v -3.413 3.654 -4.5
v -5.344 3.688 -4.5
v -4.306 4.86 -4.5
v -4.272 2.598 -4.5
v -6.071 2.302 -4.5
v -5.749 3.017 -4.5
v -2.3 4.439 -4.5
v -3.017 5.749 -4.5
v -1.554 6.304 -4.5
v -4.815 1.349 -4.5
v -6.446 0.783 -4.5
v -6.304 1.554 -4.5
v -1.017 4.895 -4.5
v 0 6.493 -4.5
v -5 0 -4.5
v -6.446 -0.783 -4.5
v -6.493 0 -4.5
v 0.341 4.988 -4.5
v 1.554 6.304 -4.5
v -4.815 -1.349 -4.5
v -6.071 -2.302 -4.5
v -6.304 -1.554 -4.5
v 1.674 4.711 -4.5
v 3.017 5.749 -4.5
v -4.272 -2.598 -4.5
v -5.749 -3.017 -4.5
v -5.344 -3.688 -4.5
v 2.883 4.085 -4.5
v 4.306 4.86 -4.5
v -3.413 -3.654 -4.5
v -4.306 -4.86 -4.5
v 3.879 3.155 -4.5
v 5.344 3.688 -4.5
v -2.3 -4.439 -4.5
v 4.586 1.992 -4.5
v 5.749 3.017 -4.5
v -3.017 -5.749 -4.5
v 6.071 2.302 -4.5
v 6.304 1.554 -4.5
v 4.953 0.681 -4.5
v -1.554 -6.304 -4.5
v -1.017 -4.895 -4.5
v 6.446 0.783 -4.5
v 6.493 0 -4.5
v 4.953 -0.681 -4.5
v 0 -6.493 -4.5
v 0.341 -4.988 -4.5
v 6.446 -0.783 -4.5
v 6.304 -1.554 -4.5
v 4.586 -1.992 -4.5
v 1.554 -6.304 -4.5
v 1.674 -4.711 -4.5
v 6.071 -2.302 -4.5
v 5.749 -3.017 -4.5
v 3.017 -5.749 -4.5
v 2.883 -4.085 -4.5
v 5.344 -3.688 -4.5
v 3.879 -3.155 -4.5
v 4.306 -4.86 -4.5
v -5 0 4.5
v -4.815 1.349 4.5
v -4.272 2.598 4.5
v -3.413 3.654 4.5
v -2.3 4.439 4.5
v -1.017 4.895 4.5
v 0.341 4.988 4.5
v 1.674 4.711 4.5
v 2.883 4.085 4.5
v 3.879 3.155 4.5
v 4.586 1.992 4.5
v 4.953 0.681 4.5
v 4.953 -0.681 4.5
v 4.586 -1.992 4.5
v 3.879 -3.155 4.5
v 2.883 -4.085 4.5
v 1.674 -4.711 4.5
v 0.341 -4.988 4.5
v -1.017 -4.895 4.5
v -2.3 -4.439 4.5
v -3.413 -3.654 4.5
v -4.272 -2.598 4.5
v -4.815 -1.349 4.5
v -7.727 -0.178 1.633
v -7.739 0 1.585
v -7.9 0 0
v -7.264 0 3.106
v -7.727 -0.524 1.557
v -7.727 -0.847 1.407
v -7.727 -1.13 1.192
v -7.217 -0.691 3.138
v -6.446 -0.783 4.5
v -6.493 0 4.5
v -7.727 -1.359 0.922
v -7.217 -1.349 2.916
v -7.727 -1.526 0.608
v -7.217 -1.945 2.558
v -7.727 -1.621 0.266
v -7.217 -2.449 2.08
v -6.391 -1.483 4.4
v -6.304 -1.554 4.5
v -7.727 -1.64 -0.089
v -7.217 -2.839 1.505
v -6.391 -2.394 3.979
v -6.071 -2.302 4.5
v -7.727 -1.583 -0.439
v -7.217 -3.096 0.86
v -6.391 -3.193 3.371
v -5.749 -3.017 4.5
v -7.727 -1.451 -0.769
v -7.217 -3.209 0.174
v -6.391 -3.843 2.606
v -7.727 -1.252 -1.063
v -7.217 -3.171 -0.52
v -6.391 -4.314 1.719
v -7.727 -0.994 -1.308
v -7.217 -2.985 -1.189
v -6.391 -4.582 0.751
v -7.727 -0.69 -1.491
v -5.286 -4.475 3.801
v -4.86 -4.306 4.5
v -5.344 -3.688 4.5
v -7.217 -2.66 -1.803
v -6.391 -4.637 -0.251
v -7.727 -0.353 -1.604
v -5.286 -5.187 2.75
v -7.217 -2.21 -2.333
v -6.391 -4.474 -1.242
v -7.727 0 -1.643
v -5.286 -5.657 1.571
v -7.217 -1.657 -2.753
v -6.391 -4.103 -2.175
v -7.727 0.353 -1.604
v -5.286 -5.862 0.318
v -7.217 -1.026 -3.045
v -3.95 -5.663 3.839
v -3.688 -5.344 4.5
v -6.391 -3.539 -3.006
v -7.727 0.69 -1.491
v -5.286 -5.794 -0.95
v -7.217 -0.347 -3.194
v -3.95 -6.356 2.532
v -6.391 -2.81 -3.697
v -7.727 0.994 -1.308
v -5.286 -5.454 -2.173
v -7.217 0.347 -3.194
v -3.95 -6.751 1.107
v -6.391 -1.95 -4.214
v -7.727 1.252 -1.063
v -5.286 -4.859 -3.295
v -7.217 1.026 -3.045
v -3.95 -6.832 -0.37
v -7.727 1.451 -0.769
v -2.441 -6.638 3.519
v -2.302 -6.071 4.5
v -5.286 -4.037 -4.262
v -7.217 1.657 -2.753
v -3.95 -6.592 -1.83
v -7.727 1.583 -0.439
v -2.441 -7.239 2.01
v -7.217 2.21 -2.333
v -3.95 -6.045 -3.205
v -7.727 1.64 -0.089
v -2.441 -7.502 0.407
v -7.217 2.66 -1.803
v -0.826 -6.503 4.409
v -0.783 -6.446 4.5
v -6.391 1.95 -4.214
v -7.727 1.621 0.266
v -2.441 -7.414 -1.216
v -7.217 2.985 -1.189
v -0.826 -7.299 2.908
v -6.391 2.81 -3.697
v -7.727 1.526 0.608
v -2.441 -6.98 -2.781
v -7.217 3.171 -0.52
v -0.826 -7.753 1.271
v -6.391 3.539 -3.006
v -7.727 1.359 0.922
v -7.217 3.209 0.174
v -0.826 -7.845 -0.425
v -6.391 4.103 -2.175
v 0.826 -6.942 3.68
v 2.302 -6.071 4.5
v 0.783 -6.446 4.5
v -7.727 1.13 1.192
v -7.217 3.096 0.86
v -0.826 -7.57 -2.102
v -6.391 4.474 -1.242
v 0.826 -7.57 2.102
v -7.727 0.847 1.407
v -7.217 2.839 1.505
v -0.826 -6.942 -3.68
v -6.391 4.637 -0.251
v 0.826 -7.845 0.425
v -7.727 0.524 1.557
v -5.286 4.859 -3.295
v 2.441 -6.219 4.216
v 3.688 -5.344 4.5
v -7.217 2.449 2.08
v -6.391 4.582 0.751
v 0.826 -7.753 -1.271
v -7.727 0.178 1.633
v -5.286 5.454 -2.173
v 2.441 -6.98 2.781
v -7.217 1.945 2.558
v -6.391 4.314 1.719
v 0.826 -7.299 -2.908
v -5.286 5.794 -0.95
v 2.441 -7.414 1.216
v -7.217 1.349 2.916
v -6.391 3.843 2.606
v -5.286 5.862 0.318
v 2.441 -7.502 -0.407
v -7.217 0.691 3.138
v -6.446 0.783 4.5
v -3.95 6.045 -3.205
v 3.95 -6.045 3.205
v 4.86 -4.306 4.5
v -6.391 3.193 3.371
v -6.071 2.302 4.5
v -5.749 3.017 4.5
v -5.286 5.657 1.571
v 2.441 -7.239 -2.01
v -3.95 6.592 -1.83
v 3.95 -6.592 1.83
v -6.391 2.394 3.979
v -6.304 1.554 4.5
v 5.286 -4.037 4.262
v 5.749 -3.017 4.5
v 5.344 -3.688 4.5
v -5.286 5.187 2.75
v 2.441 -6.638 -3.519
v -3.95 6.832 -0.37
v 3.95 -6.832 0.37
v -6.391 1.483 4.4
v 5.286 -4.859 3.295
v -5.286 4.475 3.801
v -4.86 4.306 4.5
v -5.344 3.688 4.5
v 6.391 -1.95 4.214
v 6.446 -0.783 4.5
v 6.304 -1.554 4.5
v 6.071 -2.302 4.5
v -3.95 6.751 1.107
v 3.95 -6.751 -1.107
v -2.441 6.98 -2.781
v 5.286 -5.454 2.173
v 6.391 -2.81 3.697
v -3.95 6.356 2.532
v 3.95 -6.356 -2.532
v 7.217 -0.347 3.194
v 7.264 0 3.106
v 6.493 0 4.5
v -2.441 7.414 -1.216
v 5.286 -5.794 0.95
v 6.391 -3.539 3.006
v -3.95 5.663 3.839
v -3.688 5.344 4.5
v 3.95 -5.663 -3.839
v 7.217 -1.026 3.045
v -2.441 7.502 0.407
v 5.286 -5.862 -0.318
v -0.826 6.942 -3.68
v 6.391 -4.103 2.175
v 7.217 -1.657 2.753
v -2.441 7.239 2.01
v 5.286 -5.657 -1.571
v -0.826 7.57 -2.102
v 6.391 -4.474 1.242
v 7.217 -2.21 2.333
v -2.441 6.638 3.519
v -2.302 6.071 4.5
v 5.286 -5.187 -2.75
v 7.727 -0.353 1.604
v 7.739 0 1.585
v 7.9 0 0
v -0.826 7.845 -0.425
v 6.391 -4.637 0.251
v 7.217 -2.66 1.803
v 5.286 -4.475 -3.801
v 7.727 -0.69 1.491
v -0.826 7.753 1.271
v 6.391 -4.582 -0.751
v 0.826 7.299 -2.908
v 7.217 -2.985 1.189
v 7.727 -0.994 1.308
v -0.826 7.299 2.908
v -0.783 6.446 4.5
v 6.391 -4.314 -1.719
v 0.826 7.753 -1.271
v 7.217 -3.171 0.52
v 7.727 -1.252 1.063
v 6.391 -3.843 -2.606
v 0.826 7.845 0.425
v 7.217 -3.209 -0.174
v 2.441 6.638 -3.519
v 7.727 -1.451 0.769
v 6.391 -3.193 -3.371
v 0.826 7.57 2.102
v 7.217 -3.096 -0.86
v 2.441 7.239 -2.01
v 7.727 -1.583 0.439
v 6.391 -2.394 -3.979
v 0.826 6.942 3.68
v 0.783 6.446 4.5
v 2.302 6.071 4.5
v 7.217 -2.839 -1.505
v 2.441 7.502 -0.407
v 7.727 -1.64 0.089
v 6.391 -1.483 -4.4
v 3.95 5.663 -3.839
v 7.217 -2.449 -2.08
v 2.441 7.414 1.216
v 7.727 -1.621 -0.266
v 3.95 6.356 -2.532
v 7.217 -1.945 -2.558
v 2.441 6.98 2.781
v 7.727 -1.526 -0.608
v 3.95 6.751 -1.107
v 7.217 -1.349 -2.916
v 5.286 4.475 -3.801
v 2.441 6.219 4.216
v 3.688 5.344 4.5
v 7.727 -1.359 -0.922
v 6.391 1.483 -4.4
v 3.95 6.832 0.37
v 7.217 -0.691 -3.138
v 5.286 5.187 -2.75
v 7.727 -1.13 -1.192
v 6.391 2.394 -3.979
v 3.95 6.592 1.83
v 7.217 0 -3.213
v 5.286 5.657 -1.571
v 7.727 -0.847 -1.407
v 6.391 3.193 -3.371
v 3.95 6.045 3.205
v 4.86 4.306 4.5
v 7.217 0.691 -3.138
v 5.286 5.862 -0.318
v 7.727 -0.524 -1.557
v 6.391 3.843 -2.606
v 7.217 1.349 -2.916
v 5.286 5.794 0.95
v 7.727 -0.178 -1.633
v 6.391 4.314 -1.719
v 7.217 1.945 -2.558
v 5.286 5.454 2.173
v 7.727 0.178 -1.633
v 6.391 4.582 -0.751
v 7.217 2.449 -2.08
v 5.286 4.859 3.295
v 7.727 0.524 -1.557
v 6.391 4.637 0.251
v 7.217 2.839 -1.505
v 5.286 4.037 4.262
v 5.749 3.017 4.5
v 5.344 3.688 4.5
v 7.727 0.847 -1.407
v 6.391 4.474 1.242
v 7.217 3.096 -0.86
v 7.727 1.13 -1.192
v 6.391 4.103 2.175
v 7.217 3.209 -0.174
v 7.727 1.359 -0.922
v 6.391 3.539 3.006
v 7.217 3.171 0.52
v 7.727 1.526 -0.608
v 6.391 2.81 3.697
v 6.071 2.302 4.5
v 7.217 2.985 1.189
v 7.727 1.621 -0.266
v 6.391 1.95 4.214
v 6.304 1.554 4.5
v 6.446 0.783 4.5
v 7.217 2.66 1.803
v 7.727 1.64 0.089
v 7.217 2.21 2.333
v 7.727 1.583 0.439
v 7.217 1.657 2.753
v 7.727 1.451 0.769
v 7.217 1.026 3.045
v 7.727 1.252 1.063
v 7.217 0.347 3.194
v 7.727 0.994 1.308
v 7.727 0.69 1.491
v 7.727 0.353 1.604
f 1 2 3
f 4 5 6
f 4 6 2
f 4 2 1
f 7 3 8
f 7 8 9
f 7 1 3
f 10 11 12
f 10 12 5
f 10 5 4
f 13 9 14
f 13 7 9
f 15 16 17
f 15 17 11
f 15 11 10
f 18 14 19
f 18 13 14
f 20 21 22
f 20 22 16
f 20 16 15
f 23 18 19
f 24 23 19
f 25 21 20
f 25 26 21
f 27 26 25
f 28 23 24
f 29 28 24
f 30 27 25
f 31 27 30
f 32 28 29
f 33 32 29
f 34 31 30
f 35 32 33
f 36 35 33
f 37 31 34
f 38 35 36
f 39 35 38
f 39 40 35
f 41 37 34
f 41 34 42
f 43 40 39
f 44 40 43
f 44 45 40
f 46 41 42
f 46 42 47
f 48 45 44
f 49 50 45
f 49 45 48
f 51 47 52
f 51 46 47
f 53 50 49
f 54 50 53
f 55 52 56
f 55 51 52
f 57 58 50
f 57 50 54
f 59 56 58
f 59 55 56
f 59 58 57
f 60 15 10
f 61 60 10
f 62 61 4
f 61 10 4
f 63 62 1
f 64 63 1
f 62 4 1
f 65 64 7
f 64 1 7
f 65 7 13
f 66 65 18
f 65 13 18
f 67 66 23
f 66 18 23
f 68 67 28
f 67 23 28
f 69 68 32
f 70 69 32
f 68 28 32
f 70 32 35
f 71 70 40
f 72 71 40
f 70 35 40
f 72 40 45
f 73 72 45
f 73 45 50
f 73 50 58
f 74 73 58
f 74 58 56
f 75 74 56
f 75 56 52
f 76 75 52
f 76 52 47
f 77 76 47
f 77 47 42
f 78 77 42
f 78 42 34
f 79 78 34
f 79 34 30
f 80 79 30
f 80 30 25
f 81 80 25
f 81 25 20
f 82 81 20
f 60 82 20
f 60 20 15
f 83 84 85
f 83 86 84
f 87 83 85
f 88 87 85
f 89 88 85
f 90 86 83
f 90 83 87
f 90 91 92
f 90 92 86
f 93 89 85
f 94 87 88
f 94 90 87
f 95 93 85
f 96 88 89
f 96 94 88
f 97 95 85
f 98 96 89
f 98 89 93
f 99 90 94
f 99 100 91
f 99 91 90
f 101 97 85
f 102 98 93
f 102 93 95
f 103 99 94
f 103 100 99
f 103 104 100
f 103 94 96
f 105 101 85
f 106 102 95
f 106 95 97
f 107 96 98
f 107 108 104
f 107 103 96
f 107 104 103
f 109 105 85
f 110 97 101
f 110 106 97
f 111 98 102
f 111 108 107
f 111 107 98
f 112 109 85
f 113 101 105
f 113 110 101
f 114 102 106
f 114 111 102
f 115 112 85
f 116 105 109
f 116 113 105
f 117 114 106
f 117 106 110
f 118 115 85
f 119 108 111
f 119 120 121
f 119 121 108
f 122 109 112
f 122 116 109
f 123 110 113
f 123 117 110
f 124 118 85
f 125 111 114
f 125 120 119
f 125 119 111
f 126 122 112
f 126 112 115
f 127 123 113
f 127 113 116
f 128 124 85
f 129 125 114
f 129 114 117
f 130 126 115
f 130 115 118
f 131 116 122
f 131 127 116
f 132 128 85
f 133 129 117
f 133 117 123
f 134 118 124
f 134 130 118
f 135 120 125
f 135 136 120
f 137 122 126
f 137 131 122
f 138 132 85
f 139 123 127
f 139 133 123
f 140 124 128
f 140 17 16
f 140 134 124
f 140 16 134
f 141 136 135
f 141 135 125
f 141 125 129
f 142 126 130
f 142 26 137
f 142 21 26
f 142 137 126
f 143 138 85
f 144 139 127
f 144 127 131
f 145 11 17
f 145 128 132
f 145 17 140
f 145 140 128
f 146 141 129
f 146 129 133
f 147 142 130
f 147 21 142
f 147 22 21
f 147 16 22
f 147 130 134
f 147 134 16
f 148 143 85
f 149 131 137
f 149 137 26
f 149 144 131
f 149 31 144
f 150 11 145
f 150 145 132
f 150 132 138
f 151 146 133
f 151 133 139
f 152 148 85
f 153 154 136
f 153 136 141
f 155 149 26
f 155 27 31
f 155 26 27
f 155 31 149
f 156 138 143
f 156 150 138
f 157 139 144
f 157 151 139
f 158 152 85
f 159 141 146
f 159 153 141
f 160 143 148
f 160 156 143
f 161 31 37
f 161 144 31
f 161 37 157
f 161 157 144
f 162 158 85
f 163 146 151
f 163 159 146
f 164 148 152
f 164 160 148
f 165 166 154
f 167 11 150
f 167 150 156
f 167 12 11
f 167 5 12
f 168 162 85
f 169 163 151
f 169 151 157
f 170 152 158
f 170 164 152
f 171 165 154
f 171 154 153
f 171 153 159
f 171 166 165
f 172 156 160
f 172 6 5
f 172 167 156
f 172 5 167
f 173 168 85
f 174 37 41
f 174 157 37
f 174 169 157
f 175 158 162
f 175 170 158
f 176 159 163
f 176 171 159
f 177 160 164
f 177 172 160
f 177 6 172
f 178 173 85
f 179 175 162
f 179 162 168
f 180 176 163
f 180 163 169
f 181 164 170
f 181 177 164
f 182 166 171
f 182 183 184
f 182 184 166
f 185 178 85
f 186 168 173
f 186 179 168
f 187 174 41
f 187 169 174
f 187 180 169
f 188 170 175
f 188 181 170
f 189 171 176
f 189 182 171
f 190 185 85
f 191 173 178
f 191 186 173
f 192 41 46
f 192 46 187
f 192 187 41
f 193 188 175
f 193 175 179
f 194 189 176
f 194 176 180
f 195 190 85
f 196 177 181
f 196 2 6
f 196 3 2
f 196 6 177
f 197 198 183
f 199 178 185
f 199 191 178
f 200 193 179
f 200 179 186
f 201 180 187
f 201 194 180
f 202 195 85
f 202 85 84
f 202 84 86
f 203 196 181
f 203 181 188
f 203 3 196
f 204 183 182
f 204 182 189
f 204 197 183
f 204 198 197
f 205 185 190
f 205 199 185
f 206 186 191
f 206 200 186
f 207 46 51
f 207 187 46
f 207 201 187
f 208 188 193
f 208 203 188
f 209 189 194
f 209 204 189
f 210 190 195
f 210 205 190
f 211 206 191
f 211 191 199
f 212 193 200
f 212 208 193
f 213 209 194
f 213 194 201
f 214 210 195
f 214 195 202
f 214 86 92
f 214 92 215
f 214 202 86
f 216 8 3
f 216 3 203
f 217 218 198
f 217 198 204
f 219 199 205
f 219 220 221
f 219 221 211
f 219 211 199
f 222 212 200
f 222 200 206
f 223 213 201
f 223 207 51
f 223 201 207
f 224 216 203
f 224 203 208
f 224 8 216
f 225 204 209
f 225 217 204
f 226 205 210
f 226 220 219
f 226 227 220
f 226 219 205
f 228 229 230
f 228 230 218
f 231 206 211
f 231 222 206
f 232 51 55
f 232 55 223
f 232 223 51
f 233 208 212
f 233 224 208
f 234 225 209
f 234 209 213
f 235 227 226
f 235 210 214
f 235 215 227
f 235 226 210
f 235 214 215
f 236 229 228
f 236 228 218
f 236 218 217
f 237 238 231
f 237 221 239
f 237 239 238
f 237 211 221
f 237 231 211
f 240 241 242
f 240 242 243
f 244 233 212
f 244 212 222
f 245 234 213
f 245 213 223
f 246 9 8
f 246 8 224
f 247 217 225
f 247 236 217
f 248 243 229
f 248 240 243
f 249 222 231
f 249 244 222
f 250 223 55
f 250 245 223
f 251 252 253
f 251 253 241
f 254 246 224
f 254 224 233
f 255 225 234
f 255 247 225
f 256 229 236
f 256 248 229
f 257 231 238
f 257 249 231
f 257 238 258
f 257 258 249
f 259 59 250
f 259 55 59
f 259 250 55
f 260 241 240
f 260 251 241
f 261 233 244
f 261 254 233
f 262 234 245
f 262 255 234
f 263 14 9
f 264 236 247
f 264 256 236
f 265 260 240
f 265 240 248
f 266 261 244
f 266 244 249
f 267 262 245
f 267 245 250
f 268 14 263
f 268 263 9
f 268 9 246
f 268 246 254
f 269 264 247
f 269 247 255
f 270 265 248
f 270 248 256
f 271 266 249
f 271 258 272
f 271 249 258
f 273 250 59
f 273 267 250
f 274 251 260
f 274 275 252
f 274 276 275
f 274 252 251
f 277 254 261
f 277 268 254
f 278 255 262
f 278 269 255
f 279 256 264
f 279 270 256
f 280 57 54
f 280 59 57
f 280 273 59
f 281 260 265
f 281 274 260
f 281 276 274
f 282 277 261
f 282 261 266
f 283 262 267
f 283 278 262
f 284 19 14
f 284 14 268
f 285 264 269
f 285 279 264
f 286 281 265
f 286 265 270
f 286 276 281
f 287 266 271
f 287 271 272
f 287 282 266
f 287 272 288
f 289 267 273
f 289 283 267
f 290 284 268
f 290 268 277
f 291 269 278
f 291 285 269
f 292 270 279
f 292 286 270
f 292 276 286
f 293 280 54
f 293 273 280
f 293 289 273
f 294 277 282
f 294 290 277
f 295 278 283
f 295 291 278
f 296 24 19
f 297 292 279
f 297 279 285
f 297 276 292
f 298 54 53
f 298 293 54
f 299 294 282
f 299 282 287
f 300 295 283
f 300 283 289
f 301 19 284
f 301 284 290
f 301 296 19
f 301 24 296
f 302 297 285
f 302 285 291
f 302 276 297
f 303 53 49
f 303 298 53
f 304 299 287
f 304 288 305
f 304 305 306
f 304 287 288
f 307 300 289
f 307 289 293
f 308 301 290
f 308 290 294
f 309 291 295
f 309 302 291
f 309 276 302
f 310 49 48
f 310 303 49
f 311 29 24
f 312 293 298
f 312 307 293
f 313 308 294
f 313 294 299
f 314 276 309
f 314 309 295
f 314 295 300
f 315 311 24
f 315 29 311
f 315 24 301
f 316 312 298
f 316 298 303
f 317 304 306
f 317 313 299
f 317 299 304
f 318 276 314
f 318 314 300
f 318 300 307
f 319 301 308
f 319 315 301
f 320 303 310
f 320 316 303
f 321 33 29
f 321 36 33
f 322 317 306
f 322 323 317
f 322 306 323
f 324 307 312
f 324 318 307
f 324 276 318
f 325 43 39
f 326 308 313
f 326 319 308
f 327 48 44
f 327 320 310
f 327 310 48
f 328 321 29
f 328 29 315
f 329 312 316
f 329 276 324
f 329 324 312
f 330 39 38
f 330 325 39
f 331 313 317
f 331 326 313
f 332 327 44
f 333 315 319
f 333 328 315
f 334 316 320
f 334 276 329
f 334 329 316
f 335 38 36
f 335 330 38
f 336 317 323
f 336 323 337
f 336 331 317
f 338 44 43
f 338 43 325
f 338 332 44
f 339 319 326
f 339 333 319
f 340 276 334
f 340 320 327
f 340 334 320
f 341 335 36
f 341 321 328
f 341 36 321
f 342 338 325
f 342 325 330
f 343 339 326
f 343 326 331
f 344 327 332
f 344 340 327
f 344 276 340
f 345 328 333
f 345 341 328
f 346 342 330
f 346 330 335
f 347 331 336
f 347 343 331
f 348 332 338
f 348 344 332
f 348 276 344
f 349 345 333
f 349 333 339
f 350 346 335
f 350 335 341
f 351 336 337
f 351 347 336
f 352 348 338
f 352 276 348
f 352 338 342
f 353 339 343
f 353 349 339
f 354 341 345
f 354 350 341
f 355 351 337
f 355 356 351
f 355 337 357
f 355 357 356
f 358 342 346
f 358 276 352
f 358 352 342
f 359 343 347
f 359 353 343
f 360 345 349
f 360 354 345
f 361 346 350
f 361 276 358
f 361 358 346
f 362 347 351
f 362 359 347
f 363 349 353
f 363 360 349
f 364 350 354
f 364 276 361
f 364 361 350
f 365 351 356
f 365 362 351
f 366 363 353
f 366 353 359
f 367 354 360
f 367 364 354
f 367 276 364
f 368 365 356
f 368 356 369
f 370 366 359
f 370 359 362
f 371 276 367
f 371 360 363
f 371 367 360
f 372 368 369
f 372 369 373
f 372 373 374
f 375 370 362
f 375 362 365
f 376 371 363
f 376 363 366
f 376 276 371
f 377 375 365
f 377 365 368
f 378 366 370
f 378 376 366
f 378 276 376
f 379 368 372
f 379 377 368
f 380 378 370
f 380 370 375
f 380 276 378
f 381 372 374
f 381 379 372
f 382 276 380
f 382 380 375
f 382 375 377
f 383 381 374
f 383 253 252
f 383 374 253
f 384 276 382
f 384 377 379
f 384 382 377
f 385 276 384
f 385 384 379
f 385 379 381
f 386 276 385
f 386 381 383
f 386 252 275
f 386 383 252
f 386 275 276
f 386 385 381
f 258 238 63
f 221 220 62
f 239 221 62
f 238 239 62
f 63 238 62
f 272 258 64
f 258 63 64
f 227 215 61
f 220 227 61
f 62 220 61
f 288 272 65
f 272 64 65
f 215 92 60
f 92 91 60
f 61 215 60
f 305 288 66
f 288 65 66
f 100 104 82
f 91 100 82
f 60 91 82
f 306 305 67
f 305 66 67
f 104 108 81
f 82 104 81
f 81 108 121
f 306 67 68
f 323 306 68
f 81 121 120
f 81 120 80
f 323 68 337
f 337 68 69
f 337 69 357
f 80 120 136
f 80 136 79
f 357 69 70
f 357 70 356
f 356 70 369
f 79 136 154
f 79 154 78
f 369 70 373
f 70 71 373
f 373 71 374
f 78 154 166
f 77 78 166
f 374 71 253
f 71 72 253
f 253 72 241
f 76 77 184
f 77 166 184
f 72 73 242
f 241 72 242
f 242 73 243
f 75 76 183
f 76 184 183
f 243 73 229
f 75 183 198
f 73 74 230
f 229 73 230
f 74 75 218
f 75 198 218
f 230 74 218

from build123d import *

# Parameters (mm, degrees)
CUT_EXTRUDE_1_DEPTH      = 10
CUT_EXTRUDE_1_DEPTH_BACK = 10
SKETCH_2_OUTSIDE_W       = 23.274
SKETCH_2_OUTSIDE_H       = 23.274
SKETCH_2_OUTSIDE_W_2     = 21.284245121
SKETCH_2_OUTSIDE_H_2     = 9
SKETCH_3_R               = 5
CUT_EXTRUDE_2_DEPTH      = 10


with BuildPart() as part:
    # 草图1 → 旋转1 (revolve)
    with BuildSketch(Plane(origin=(0, 0, 0), x_dir=(1, 0, 0), z_dir=(0, 1, 0))):
        with BuildLine():
            ThreePointArc((7.9, 0), (0, 7.9), (-7.9, 0))
            Line((-7.9, 0), (7.9, 0))
        make_face()
    revolve(axis=Axis((-7.9, 0, 0), (1, 0, 0)))

    # 草图2 outside → 切除-拉伸1 (cut, two sides: drawn at the far end of the back side and taken through both)
    with BuildSketch(Plane(origin=(0, 0, 0), x_dir=(1, 0, 0), z_dir=(0, 1, 0)).offset(-CUT_EXTRUDE_1_DEPTH_BACK)):
        Rectangle(SKETCH_2_OUTSIDE_W, SKETCH_2_OUTSIDE_H)
        with Locations((-0.394714959, 0)):
            Rectangle(SKETCH_2_OUTSIDE_W_2, SKETCH_2_OUTSIDE_H_2, mode=Mode.SUBTRACT)
    extrude(amount=CUT_EXTRUDE_1_DEPTH + CUT_EXTRUDE_1_DEPTH_BACK, mode=Mode.SUBTRACT)

    # 草图3 → 切除-拉伸2 (cut)
    with BuildSketch(Plane(origin=(0, 0, -4.5), x_dir=(-1, 0, 0), z_dir=(0, 0, -1))):
        Circle(SKETCH_3_R)
    extrude(amount=-CUT_EXTRUDE_2_DEPTH, mode=Mode.SUBTRACT)


solid = part.part
